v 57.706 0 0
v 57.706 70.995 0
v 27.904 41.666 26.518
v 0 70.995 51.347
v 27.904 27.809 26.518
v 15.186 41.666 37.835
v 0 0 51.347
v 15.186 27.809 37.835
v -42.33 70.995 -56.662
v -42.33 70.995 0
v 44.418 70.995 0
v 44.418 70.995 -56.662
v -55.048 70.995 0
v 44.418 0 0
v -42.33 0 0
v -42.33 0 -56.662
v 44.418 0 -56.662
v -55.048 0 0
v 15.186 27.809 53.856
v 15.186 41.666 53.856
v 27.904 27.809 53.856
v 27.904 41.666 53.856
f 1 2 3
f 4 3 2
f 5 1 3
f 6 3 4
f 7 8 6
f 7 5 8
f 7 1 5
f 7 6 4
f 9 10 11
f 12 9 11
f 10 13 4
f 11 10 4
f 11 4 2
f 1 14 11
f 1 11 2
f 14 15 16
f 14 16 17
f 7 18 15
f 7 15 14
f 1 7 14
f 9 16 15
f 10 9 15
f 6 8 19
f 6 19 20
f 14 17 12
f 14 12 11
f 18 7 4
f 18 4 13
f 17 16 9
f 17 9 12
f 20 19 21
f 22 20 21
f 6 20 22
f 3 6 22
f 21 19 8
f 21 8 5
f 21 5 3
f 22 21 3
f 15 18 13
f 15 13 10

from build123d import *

# Parameters (mm, degrees)
F0_W     = 86.748682
F0_H     = 56.661889
F1_DEPTH = 70.99464
F2_W     = 12.718076
F2_H     = 13.857008
F3_DEPTH = 53.85619


with BuildPart() as f1:
    # F0 (on Front) → F1 (new body)
    with BuildSketch(Plane.XZ):
        with Locations((1.04402, -28.330944)):
            Rectangle(F0_W, F0_H)
        Polygon((57.705909, 0), (0, 51.346868), (-55.048399, 0), (-42.330321, 0), (44.418361, 0), align=None)
    extrude(amount=-F1_DEPTH)

    # F2 (on Top) → F3 (join)
    with BuildSketch(Plane.XY):
        with Locations((21.544804, 34.737437)):
            Rectangle(F2_W, F2_H)
    extrude(amount=F3_DEPTH)


solid = f1.part
